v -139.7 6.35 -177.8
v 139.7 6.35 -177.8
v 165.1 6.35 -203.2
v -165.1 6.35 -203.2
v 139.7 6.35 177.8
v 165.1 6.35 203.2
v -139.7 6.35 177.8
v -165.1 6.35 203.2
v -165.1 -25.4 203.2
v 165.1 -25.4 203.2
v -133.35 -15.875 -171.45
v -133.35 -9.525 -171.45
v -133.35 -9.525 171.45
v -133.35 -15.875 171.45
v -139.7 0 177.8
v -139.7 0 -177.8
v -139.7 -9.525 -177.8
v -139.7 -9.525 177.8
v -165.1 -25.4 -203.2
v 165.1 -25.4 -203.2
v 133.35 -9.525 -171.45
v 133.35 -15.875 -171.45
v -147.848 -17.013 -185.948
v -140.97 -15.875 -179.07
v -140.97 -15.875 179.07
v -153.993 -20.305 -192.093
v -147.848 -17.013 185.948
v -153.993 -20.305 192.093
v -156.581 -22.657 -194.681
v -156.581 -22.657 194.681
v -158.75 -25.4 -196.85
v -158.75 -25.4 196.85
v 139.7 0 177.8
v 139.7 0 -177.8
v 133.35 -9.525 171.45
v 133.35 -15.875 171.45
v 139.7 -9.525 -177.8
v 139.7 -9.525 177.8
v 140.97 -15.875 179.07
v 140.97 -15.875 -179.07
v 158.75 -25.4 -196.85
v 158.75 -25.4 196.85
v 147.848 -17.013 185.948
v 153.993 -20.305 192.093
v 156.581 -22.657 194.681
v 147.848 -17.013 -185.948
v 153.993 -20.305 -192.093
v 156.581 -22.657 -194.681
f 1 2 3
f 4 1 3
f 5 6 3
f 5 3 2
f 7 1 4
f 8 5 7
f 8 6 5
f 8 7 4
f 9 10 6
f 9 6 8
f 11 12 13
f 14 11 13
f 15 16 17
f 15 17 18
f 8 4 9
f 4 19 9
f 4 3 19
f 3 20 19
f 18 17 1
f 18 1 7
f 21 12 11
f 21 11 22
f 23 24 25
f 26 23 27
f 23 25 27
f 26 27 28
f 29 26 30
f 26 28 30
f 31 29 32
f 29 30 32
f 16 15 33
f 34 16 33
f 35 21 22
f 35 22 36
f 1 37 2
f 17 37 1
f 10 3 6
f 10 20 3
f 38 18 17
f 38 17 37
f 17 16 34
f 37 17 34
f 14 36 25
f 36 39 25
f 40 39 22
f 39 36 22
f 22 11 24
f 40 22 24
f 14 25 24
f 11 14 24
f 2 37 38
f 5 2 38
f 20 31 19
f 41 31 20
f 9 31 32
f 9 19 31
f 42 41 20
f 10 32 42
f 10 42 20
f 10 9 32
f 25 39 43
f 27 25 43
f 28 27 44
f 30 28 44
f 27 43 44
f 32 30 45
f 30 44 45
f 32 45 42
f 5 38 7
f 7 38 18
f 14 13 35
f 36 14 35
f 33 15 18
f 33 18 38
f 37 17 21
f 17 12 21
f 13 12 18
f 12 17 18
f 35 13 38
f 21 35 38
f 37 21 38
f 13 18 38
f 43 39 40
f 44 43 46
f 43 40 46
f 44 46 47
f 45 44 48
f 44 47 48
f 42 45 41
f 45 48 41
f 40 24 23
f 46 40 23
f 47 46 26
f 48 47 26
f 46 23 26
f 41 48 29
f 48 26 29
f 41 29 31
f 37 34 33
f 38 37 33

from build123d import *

# Parameters (mm, degrees)
F0_W     = 279.4
F0_H     = 355.6
F1_DEPTH = 9.525
F2_W     = 330.2
F2_H     = 406.4
F2_W_2   = 279.4
F2_H_2   = 355.6
F2_W_3   = 266.7
F2_H_3   = 342.9
F3_DEPTH = 15.875
F4_W     = 330.2
F4_H     = 406.4
F4_W_2   = 279.4
F4_H_2   = 355.6
F5_DEPTH = 15.875


with BuildPart() as f1:
    # F0 (on Front) → F1 (new body)
    with BuildSketch(Plane.XZ):
        Rectangle(F0_W, F0_H)
    extrude(amount=F1_DEPTH)


with BuildPart() as f3:
    # F2 (on face) → F3 (new body)
    with BuildSketch(Plane.XZ.offset(9.525)):
        Rectangle(F2_W, F2_H)
        Rectangle(F2_W_2, F2_H_2, mode=Mode.SUBTRACT)
        Rectangle(F2_W_2, F2_H_2)
        Rectangle(F2_W_3, F2_H_3, mode=Mode.SUBTRACT)
    extrude(amount=F3_DEPTH)

    # F4 (on face) → F5 (join)
    with BuildSketch(Plane(origin=(0, -9.525, 0), x_dir=(-1, 0, 0), z_dir=(0, 1, 0))):
        Rectangle(F4_W, F4_H)
        Rectangle(F4_W_2, F4_H_2, mode=Mode.SUBTRACT)
    extrude(amount=F5_DEPTH)

    # F7: sweep along a path in F7_path
    with BuildLine(Plane(origin=(-133.35, -25.4, -171.45), x_dir=(0, 0, 1), z_dir=(0, -1, 0))) as f7_path:
        Line((0, 0), (342.9, 0))
        Line((342.9, 0), (342.9, -266.7))
        Line((342.9, -266.7), (0, -266.7))
        Line((0, -266.7), (0, 0))
    # F6 (on Top) → F7 (sweep, cut)
    with BuildSketch(Plane.XY):
        with BuildLine():
            Line((-158.75, -25.4), (-133.35, -25.4))
            Line((-133.35, -25.4), (-133.35, -15.875))
            Line((-133.35, -15.875), (-140.97, -15.875))
            ThreePointArc((-140.97, -15.875), (-151.0553114107, -18.4062520334), (-158.75, -25.4))
        make_face()
    sweep(path=f7_path.line, transition=Transition.RIGHT, mode=Mode.SUBTRACT)


solid = Compound([f1.part, f3.part])
